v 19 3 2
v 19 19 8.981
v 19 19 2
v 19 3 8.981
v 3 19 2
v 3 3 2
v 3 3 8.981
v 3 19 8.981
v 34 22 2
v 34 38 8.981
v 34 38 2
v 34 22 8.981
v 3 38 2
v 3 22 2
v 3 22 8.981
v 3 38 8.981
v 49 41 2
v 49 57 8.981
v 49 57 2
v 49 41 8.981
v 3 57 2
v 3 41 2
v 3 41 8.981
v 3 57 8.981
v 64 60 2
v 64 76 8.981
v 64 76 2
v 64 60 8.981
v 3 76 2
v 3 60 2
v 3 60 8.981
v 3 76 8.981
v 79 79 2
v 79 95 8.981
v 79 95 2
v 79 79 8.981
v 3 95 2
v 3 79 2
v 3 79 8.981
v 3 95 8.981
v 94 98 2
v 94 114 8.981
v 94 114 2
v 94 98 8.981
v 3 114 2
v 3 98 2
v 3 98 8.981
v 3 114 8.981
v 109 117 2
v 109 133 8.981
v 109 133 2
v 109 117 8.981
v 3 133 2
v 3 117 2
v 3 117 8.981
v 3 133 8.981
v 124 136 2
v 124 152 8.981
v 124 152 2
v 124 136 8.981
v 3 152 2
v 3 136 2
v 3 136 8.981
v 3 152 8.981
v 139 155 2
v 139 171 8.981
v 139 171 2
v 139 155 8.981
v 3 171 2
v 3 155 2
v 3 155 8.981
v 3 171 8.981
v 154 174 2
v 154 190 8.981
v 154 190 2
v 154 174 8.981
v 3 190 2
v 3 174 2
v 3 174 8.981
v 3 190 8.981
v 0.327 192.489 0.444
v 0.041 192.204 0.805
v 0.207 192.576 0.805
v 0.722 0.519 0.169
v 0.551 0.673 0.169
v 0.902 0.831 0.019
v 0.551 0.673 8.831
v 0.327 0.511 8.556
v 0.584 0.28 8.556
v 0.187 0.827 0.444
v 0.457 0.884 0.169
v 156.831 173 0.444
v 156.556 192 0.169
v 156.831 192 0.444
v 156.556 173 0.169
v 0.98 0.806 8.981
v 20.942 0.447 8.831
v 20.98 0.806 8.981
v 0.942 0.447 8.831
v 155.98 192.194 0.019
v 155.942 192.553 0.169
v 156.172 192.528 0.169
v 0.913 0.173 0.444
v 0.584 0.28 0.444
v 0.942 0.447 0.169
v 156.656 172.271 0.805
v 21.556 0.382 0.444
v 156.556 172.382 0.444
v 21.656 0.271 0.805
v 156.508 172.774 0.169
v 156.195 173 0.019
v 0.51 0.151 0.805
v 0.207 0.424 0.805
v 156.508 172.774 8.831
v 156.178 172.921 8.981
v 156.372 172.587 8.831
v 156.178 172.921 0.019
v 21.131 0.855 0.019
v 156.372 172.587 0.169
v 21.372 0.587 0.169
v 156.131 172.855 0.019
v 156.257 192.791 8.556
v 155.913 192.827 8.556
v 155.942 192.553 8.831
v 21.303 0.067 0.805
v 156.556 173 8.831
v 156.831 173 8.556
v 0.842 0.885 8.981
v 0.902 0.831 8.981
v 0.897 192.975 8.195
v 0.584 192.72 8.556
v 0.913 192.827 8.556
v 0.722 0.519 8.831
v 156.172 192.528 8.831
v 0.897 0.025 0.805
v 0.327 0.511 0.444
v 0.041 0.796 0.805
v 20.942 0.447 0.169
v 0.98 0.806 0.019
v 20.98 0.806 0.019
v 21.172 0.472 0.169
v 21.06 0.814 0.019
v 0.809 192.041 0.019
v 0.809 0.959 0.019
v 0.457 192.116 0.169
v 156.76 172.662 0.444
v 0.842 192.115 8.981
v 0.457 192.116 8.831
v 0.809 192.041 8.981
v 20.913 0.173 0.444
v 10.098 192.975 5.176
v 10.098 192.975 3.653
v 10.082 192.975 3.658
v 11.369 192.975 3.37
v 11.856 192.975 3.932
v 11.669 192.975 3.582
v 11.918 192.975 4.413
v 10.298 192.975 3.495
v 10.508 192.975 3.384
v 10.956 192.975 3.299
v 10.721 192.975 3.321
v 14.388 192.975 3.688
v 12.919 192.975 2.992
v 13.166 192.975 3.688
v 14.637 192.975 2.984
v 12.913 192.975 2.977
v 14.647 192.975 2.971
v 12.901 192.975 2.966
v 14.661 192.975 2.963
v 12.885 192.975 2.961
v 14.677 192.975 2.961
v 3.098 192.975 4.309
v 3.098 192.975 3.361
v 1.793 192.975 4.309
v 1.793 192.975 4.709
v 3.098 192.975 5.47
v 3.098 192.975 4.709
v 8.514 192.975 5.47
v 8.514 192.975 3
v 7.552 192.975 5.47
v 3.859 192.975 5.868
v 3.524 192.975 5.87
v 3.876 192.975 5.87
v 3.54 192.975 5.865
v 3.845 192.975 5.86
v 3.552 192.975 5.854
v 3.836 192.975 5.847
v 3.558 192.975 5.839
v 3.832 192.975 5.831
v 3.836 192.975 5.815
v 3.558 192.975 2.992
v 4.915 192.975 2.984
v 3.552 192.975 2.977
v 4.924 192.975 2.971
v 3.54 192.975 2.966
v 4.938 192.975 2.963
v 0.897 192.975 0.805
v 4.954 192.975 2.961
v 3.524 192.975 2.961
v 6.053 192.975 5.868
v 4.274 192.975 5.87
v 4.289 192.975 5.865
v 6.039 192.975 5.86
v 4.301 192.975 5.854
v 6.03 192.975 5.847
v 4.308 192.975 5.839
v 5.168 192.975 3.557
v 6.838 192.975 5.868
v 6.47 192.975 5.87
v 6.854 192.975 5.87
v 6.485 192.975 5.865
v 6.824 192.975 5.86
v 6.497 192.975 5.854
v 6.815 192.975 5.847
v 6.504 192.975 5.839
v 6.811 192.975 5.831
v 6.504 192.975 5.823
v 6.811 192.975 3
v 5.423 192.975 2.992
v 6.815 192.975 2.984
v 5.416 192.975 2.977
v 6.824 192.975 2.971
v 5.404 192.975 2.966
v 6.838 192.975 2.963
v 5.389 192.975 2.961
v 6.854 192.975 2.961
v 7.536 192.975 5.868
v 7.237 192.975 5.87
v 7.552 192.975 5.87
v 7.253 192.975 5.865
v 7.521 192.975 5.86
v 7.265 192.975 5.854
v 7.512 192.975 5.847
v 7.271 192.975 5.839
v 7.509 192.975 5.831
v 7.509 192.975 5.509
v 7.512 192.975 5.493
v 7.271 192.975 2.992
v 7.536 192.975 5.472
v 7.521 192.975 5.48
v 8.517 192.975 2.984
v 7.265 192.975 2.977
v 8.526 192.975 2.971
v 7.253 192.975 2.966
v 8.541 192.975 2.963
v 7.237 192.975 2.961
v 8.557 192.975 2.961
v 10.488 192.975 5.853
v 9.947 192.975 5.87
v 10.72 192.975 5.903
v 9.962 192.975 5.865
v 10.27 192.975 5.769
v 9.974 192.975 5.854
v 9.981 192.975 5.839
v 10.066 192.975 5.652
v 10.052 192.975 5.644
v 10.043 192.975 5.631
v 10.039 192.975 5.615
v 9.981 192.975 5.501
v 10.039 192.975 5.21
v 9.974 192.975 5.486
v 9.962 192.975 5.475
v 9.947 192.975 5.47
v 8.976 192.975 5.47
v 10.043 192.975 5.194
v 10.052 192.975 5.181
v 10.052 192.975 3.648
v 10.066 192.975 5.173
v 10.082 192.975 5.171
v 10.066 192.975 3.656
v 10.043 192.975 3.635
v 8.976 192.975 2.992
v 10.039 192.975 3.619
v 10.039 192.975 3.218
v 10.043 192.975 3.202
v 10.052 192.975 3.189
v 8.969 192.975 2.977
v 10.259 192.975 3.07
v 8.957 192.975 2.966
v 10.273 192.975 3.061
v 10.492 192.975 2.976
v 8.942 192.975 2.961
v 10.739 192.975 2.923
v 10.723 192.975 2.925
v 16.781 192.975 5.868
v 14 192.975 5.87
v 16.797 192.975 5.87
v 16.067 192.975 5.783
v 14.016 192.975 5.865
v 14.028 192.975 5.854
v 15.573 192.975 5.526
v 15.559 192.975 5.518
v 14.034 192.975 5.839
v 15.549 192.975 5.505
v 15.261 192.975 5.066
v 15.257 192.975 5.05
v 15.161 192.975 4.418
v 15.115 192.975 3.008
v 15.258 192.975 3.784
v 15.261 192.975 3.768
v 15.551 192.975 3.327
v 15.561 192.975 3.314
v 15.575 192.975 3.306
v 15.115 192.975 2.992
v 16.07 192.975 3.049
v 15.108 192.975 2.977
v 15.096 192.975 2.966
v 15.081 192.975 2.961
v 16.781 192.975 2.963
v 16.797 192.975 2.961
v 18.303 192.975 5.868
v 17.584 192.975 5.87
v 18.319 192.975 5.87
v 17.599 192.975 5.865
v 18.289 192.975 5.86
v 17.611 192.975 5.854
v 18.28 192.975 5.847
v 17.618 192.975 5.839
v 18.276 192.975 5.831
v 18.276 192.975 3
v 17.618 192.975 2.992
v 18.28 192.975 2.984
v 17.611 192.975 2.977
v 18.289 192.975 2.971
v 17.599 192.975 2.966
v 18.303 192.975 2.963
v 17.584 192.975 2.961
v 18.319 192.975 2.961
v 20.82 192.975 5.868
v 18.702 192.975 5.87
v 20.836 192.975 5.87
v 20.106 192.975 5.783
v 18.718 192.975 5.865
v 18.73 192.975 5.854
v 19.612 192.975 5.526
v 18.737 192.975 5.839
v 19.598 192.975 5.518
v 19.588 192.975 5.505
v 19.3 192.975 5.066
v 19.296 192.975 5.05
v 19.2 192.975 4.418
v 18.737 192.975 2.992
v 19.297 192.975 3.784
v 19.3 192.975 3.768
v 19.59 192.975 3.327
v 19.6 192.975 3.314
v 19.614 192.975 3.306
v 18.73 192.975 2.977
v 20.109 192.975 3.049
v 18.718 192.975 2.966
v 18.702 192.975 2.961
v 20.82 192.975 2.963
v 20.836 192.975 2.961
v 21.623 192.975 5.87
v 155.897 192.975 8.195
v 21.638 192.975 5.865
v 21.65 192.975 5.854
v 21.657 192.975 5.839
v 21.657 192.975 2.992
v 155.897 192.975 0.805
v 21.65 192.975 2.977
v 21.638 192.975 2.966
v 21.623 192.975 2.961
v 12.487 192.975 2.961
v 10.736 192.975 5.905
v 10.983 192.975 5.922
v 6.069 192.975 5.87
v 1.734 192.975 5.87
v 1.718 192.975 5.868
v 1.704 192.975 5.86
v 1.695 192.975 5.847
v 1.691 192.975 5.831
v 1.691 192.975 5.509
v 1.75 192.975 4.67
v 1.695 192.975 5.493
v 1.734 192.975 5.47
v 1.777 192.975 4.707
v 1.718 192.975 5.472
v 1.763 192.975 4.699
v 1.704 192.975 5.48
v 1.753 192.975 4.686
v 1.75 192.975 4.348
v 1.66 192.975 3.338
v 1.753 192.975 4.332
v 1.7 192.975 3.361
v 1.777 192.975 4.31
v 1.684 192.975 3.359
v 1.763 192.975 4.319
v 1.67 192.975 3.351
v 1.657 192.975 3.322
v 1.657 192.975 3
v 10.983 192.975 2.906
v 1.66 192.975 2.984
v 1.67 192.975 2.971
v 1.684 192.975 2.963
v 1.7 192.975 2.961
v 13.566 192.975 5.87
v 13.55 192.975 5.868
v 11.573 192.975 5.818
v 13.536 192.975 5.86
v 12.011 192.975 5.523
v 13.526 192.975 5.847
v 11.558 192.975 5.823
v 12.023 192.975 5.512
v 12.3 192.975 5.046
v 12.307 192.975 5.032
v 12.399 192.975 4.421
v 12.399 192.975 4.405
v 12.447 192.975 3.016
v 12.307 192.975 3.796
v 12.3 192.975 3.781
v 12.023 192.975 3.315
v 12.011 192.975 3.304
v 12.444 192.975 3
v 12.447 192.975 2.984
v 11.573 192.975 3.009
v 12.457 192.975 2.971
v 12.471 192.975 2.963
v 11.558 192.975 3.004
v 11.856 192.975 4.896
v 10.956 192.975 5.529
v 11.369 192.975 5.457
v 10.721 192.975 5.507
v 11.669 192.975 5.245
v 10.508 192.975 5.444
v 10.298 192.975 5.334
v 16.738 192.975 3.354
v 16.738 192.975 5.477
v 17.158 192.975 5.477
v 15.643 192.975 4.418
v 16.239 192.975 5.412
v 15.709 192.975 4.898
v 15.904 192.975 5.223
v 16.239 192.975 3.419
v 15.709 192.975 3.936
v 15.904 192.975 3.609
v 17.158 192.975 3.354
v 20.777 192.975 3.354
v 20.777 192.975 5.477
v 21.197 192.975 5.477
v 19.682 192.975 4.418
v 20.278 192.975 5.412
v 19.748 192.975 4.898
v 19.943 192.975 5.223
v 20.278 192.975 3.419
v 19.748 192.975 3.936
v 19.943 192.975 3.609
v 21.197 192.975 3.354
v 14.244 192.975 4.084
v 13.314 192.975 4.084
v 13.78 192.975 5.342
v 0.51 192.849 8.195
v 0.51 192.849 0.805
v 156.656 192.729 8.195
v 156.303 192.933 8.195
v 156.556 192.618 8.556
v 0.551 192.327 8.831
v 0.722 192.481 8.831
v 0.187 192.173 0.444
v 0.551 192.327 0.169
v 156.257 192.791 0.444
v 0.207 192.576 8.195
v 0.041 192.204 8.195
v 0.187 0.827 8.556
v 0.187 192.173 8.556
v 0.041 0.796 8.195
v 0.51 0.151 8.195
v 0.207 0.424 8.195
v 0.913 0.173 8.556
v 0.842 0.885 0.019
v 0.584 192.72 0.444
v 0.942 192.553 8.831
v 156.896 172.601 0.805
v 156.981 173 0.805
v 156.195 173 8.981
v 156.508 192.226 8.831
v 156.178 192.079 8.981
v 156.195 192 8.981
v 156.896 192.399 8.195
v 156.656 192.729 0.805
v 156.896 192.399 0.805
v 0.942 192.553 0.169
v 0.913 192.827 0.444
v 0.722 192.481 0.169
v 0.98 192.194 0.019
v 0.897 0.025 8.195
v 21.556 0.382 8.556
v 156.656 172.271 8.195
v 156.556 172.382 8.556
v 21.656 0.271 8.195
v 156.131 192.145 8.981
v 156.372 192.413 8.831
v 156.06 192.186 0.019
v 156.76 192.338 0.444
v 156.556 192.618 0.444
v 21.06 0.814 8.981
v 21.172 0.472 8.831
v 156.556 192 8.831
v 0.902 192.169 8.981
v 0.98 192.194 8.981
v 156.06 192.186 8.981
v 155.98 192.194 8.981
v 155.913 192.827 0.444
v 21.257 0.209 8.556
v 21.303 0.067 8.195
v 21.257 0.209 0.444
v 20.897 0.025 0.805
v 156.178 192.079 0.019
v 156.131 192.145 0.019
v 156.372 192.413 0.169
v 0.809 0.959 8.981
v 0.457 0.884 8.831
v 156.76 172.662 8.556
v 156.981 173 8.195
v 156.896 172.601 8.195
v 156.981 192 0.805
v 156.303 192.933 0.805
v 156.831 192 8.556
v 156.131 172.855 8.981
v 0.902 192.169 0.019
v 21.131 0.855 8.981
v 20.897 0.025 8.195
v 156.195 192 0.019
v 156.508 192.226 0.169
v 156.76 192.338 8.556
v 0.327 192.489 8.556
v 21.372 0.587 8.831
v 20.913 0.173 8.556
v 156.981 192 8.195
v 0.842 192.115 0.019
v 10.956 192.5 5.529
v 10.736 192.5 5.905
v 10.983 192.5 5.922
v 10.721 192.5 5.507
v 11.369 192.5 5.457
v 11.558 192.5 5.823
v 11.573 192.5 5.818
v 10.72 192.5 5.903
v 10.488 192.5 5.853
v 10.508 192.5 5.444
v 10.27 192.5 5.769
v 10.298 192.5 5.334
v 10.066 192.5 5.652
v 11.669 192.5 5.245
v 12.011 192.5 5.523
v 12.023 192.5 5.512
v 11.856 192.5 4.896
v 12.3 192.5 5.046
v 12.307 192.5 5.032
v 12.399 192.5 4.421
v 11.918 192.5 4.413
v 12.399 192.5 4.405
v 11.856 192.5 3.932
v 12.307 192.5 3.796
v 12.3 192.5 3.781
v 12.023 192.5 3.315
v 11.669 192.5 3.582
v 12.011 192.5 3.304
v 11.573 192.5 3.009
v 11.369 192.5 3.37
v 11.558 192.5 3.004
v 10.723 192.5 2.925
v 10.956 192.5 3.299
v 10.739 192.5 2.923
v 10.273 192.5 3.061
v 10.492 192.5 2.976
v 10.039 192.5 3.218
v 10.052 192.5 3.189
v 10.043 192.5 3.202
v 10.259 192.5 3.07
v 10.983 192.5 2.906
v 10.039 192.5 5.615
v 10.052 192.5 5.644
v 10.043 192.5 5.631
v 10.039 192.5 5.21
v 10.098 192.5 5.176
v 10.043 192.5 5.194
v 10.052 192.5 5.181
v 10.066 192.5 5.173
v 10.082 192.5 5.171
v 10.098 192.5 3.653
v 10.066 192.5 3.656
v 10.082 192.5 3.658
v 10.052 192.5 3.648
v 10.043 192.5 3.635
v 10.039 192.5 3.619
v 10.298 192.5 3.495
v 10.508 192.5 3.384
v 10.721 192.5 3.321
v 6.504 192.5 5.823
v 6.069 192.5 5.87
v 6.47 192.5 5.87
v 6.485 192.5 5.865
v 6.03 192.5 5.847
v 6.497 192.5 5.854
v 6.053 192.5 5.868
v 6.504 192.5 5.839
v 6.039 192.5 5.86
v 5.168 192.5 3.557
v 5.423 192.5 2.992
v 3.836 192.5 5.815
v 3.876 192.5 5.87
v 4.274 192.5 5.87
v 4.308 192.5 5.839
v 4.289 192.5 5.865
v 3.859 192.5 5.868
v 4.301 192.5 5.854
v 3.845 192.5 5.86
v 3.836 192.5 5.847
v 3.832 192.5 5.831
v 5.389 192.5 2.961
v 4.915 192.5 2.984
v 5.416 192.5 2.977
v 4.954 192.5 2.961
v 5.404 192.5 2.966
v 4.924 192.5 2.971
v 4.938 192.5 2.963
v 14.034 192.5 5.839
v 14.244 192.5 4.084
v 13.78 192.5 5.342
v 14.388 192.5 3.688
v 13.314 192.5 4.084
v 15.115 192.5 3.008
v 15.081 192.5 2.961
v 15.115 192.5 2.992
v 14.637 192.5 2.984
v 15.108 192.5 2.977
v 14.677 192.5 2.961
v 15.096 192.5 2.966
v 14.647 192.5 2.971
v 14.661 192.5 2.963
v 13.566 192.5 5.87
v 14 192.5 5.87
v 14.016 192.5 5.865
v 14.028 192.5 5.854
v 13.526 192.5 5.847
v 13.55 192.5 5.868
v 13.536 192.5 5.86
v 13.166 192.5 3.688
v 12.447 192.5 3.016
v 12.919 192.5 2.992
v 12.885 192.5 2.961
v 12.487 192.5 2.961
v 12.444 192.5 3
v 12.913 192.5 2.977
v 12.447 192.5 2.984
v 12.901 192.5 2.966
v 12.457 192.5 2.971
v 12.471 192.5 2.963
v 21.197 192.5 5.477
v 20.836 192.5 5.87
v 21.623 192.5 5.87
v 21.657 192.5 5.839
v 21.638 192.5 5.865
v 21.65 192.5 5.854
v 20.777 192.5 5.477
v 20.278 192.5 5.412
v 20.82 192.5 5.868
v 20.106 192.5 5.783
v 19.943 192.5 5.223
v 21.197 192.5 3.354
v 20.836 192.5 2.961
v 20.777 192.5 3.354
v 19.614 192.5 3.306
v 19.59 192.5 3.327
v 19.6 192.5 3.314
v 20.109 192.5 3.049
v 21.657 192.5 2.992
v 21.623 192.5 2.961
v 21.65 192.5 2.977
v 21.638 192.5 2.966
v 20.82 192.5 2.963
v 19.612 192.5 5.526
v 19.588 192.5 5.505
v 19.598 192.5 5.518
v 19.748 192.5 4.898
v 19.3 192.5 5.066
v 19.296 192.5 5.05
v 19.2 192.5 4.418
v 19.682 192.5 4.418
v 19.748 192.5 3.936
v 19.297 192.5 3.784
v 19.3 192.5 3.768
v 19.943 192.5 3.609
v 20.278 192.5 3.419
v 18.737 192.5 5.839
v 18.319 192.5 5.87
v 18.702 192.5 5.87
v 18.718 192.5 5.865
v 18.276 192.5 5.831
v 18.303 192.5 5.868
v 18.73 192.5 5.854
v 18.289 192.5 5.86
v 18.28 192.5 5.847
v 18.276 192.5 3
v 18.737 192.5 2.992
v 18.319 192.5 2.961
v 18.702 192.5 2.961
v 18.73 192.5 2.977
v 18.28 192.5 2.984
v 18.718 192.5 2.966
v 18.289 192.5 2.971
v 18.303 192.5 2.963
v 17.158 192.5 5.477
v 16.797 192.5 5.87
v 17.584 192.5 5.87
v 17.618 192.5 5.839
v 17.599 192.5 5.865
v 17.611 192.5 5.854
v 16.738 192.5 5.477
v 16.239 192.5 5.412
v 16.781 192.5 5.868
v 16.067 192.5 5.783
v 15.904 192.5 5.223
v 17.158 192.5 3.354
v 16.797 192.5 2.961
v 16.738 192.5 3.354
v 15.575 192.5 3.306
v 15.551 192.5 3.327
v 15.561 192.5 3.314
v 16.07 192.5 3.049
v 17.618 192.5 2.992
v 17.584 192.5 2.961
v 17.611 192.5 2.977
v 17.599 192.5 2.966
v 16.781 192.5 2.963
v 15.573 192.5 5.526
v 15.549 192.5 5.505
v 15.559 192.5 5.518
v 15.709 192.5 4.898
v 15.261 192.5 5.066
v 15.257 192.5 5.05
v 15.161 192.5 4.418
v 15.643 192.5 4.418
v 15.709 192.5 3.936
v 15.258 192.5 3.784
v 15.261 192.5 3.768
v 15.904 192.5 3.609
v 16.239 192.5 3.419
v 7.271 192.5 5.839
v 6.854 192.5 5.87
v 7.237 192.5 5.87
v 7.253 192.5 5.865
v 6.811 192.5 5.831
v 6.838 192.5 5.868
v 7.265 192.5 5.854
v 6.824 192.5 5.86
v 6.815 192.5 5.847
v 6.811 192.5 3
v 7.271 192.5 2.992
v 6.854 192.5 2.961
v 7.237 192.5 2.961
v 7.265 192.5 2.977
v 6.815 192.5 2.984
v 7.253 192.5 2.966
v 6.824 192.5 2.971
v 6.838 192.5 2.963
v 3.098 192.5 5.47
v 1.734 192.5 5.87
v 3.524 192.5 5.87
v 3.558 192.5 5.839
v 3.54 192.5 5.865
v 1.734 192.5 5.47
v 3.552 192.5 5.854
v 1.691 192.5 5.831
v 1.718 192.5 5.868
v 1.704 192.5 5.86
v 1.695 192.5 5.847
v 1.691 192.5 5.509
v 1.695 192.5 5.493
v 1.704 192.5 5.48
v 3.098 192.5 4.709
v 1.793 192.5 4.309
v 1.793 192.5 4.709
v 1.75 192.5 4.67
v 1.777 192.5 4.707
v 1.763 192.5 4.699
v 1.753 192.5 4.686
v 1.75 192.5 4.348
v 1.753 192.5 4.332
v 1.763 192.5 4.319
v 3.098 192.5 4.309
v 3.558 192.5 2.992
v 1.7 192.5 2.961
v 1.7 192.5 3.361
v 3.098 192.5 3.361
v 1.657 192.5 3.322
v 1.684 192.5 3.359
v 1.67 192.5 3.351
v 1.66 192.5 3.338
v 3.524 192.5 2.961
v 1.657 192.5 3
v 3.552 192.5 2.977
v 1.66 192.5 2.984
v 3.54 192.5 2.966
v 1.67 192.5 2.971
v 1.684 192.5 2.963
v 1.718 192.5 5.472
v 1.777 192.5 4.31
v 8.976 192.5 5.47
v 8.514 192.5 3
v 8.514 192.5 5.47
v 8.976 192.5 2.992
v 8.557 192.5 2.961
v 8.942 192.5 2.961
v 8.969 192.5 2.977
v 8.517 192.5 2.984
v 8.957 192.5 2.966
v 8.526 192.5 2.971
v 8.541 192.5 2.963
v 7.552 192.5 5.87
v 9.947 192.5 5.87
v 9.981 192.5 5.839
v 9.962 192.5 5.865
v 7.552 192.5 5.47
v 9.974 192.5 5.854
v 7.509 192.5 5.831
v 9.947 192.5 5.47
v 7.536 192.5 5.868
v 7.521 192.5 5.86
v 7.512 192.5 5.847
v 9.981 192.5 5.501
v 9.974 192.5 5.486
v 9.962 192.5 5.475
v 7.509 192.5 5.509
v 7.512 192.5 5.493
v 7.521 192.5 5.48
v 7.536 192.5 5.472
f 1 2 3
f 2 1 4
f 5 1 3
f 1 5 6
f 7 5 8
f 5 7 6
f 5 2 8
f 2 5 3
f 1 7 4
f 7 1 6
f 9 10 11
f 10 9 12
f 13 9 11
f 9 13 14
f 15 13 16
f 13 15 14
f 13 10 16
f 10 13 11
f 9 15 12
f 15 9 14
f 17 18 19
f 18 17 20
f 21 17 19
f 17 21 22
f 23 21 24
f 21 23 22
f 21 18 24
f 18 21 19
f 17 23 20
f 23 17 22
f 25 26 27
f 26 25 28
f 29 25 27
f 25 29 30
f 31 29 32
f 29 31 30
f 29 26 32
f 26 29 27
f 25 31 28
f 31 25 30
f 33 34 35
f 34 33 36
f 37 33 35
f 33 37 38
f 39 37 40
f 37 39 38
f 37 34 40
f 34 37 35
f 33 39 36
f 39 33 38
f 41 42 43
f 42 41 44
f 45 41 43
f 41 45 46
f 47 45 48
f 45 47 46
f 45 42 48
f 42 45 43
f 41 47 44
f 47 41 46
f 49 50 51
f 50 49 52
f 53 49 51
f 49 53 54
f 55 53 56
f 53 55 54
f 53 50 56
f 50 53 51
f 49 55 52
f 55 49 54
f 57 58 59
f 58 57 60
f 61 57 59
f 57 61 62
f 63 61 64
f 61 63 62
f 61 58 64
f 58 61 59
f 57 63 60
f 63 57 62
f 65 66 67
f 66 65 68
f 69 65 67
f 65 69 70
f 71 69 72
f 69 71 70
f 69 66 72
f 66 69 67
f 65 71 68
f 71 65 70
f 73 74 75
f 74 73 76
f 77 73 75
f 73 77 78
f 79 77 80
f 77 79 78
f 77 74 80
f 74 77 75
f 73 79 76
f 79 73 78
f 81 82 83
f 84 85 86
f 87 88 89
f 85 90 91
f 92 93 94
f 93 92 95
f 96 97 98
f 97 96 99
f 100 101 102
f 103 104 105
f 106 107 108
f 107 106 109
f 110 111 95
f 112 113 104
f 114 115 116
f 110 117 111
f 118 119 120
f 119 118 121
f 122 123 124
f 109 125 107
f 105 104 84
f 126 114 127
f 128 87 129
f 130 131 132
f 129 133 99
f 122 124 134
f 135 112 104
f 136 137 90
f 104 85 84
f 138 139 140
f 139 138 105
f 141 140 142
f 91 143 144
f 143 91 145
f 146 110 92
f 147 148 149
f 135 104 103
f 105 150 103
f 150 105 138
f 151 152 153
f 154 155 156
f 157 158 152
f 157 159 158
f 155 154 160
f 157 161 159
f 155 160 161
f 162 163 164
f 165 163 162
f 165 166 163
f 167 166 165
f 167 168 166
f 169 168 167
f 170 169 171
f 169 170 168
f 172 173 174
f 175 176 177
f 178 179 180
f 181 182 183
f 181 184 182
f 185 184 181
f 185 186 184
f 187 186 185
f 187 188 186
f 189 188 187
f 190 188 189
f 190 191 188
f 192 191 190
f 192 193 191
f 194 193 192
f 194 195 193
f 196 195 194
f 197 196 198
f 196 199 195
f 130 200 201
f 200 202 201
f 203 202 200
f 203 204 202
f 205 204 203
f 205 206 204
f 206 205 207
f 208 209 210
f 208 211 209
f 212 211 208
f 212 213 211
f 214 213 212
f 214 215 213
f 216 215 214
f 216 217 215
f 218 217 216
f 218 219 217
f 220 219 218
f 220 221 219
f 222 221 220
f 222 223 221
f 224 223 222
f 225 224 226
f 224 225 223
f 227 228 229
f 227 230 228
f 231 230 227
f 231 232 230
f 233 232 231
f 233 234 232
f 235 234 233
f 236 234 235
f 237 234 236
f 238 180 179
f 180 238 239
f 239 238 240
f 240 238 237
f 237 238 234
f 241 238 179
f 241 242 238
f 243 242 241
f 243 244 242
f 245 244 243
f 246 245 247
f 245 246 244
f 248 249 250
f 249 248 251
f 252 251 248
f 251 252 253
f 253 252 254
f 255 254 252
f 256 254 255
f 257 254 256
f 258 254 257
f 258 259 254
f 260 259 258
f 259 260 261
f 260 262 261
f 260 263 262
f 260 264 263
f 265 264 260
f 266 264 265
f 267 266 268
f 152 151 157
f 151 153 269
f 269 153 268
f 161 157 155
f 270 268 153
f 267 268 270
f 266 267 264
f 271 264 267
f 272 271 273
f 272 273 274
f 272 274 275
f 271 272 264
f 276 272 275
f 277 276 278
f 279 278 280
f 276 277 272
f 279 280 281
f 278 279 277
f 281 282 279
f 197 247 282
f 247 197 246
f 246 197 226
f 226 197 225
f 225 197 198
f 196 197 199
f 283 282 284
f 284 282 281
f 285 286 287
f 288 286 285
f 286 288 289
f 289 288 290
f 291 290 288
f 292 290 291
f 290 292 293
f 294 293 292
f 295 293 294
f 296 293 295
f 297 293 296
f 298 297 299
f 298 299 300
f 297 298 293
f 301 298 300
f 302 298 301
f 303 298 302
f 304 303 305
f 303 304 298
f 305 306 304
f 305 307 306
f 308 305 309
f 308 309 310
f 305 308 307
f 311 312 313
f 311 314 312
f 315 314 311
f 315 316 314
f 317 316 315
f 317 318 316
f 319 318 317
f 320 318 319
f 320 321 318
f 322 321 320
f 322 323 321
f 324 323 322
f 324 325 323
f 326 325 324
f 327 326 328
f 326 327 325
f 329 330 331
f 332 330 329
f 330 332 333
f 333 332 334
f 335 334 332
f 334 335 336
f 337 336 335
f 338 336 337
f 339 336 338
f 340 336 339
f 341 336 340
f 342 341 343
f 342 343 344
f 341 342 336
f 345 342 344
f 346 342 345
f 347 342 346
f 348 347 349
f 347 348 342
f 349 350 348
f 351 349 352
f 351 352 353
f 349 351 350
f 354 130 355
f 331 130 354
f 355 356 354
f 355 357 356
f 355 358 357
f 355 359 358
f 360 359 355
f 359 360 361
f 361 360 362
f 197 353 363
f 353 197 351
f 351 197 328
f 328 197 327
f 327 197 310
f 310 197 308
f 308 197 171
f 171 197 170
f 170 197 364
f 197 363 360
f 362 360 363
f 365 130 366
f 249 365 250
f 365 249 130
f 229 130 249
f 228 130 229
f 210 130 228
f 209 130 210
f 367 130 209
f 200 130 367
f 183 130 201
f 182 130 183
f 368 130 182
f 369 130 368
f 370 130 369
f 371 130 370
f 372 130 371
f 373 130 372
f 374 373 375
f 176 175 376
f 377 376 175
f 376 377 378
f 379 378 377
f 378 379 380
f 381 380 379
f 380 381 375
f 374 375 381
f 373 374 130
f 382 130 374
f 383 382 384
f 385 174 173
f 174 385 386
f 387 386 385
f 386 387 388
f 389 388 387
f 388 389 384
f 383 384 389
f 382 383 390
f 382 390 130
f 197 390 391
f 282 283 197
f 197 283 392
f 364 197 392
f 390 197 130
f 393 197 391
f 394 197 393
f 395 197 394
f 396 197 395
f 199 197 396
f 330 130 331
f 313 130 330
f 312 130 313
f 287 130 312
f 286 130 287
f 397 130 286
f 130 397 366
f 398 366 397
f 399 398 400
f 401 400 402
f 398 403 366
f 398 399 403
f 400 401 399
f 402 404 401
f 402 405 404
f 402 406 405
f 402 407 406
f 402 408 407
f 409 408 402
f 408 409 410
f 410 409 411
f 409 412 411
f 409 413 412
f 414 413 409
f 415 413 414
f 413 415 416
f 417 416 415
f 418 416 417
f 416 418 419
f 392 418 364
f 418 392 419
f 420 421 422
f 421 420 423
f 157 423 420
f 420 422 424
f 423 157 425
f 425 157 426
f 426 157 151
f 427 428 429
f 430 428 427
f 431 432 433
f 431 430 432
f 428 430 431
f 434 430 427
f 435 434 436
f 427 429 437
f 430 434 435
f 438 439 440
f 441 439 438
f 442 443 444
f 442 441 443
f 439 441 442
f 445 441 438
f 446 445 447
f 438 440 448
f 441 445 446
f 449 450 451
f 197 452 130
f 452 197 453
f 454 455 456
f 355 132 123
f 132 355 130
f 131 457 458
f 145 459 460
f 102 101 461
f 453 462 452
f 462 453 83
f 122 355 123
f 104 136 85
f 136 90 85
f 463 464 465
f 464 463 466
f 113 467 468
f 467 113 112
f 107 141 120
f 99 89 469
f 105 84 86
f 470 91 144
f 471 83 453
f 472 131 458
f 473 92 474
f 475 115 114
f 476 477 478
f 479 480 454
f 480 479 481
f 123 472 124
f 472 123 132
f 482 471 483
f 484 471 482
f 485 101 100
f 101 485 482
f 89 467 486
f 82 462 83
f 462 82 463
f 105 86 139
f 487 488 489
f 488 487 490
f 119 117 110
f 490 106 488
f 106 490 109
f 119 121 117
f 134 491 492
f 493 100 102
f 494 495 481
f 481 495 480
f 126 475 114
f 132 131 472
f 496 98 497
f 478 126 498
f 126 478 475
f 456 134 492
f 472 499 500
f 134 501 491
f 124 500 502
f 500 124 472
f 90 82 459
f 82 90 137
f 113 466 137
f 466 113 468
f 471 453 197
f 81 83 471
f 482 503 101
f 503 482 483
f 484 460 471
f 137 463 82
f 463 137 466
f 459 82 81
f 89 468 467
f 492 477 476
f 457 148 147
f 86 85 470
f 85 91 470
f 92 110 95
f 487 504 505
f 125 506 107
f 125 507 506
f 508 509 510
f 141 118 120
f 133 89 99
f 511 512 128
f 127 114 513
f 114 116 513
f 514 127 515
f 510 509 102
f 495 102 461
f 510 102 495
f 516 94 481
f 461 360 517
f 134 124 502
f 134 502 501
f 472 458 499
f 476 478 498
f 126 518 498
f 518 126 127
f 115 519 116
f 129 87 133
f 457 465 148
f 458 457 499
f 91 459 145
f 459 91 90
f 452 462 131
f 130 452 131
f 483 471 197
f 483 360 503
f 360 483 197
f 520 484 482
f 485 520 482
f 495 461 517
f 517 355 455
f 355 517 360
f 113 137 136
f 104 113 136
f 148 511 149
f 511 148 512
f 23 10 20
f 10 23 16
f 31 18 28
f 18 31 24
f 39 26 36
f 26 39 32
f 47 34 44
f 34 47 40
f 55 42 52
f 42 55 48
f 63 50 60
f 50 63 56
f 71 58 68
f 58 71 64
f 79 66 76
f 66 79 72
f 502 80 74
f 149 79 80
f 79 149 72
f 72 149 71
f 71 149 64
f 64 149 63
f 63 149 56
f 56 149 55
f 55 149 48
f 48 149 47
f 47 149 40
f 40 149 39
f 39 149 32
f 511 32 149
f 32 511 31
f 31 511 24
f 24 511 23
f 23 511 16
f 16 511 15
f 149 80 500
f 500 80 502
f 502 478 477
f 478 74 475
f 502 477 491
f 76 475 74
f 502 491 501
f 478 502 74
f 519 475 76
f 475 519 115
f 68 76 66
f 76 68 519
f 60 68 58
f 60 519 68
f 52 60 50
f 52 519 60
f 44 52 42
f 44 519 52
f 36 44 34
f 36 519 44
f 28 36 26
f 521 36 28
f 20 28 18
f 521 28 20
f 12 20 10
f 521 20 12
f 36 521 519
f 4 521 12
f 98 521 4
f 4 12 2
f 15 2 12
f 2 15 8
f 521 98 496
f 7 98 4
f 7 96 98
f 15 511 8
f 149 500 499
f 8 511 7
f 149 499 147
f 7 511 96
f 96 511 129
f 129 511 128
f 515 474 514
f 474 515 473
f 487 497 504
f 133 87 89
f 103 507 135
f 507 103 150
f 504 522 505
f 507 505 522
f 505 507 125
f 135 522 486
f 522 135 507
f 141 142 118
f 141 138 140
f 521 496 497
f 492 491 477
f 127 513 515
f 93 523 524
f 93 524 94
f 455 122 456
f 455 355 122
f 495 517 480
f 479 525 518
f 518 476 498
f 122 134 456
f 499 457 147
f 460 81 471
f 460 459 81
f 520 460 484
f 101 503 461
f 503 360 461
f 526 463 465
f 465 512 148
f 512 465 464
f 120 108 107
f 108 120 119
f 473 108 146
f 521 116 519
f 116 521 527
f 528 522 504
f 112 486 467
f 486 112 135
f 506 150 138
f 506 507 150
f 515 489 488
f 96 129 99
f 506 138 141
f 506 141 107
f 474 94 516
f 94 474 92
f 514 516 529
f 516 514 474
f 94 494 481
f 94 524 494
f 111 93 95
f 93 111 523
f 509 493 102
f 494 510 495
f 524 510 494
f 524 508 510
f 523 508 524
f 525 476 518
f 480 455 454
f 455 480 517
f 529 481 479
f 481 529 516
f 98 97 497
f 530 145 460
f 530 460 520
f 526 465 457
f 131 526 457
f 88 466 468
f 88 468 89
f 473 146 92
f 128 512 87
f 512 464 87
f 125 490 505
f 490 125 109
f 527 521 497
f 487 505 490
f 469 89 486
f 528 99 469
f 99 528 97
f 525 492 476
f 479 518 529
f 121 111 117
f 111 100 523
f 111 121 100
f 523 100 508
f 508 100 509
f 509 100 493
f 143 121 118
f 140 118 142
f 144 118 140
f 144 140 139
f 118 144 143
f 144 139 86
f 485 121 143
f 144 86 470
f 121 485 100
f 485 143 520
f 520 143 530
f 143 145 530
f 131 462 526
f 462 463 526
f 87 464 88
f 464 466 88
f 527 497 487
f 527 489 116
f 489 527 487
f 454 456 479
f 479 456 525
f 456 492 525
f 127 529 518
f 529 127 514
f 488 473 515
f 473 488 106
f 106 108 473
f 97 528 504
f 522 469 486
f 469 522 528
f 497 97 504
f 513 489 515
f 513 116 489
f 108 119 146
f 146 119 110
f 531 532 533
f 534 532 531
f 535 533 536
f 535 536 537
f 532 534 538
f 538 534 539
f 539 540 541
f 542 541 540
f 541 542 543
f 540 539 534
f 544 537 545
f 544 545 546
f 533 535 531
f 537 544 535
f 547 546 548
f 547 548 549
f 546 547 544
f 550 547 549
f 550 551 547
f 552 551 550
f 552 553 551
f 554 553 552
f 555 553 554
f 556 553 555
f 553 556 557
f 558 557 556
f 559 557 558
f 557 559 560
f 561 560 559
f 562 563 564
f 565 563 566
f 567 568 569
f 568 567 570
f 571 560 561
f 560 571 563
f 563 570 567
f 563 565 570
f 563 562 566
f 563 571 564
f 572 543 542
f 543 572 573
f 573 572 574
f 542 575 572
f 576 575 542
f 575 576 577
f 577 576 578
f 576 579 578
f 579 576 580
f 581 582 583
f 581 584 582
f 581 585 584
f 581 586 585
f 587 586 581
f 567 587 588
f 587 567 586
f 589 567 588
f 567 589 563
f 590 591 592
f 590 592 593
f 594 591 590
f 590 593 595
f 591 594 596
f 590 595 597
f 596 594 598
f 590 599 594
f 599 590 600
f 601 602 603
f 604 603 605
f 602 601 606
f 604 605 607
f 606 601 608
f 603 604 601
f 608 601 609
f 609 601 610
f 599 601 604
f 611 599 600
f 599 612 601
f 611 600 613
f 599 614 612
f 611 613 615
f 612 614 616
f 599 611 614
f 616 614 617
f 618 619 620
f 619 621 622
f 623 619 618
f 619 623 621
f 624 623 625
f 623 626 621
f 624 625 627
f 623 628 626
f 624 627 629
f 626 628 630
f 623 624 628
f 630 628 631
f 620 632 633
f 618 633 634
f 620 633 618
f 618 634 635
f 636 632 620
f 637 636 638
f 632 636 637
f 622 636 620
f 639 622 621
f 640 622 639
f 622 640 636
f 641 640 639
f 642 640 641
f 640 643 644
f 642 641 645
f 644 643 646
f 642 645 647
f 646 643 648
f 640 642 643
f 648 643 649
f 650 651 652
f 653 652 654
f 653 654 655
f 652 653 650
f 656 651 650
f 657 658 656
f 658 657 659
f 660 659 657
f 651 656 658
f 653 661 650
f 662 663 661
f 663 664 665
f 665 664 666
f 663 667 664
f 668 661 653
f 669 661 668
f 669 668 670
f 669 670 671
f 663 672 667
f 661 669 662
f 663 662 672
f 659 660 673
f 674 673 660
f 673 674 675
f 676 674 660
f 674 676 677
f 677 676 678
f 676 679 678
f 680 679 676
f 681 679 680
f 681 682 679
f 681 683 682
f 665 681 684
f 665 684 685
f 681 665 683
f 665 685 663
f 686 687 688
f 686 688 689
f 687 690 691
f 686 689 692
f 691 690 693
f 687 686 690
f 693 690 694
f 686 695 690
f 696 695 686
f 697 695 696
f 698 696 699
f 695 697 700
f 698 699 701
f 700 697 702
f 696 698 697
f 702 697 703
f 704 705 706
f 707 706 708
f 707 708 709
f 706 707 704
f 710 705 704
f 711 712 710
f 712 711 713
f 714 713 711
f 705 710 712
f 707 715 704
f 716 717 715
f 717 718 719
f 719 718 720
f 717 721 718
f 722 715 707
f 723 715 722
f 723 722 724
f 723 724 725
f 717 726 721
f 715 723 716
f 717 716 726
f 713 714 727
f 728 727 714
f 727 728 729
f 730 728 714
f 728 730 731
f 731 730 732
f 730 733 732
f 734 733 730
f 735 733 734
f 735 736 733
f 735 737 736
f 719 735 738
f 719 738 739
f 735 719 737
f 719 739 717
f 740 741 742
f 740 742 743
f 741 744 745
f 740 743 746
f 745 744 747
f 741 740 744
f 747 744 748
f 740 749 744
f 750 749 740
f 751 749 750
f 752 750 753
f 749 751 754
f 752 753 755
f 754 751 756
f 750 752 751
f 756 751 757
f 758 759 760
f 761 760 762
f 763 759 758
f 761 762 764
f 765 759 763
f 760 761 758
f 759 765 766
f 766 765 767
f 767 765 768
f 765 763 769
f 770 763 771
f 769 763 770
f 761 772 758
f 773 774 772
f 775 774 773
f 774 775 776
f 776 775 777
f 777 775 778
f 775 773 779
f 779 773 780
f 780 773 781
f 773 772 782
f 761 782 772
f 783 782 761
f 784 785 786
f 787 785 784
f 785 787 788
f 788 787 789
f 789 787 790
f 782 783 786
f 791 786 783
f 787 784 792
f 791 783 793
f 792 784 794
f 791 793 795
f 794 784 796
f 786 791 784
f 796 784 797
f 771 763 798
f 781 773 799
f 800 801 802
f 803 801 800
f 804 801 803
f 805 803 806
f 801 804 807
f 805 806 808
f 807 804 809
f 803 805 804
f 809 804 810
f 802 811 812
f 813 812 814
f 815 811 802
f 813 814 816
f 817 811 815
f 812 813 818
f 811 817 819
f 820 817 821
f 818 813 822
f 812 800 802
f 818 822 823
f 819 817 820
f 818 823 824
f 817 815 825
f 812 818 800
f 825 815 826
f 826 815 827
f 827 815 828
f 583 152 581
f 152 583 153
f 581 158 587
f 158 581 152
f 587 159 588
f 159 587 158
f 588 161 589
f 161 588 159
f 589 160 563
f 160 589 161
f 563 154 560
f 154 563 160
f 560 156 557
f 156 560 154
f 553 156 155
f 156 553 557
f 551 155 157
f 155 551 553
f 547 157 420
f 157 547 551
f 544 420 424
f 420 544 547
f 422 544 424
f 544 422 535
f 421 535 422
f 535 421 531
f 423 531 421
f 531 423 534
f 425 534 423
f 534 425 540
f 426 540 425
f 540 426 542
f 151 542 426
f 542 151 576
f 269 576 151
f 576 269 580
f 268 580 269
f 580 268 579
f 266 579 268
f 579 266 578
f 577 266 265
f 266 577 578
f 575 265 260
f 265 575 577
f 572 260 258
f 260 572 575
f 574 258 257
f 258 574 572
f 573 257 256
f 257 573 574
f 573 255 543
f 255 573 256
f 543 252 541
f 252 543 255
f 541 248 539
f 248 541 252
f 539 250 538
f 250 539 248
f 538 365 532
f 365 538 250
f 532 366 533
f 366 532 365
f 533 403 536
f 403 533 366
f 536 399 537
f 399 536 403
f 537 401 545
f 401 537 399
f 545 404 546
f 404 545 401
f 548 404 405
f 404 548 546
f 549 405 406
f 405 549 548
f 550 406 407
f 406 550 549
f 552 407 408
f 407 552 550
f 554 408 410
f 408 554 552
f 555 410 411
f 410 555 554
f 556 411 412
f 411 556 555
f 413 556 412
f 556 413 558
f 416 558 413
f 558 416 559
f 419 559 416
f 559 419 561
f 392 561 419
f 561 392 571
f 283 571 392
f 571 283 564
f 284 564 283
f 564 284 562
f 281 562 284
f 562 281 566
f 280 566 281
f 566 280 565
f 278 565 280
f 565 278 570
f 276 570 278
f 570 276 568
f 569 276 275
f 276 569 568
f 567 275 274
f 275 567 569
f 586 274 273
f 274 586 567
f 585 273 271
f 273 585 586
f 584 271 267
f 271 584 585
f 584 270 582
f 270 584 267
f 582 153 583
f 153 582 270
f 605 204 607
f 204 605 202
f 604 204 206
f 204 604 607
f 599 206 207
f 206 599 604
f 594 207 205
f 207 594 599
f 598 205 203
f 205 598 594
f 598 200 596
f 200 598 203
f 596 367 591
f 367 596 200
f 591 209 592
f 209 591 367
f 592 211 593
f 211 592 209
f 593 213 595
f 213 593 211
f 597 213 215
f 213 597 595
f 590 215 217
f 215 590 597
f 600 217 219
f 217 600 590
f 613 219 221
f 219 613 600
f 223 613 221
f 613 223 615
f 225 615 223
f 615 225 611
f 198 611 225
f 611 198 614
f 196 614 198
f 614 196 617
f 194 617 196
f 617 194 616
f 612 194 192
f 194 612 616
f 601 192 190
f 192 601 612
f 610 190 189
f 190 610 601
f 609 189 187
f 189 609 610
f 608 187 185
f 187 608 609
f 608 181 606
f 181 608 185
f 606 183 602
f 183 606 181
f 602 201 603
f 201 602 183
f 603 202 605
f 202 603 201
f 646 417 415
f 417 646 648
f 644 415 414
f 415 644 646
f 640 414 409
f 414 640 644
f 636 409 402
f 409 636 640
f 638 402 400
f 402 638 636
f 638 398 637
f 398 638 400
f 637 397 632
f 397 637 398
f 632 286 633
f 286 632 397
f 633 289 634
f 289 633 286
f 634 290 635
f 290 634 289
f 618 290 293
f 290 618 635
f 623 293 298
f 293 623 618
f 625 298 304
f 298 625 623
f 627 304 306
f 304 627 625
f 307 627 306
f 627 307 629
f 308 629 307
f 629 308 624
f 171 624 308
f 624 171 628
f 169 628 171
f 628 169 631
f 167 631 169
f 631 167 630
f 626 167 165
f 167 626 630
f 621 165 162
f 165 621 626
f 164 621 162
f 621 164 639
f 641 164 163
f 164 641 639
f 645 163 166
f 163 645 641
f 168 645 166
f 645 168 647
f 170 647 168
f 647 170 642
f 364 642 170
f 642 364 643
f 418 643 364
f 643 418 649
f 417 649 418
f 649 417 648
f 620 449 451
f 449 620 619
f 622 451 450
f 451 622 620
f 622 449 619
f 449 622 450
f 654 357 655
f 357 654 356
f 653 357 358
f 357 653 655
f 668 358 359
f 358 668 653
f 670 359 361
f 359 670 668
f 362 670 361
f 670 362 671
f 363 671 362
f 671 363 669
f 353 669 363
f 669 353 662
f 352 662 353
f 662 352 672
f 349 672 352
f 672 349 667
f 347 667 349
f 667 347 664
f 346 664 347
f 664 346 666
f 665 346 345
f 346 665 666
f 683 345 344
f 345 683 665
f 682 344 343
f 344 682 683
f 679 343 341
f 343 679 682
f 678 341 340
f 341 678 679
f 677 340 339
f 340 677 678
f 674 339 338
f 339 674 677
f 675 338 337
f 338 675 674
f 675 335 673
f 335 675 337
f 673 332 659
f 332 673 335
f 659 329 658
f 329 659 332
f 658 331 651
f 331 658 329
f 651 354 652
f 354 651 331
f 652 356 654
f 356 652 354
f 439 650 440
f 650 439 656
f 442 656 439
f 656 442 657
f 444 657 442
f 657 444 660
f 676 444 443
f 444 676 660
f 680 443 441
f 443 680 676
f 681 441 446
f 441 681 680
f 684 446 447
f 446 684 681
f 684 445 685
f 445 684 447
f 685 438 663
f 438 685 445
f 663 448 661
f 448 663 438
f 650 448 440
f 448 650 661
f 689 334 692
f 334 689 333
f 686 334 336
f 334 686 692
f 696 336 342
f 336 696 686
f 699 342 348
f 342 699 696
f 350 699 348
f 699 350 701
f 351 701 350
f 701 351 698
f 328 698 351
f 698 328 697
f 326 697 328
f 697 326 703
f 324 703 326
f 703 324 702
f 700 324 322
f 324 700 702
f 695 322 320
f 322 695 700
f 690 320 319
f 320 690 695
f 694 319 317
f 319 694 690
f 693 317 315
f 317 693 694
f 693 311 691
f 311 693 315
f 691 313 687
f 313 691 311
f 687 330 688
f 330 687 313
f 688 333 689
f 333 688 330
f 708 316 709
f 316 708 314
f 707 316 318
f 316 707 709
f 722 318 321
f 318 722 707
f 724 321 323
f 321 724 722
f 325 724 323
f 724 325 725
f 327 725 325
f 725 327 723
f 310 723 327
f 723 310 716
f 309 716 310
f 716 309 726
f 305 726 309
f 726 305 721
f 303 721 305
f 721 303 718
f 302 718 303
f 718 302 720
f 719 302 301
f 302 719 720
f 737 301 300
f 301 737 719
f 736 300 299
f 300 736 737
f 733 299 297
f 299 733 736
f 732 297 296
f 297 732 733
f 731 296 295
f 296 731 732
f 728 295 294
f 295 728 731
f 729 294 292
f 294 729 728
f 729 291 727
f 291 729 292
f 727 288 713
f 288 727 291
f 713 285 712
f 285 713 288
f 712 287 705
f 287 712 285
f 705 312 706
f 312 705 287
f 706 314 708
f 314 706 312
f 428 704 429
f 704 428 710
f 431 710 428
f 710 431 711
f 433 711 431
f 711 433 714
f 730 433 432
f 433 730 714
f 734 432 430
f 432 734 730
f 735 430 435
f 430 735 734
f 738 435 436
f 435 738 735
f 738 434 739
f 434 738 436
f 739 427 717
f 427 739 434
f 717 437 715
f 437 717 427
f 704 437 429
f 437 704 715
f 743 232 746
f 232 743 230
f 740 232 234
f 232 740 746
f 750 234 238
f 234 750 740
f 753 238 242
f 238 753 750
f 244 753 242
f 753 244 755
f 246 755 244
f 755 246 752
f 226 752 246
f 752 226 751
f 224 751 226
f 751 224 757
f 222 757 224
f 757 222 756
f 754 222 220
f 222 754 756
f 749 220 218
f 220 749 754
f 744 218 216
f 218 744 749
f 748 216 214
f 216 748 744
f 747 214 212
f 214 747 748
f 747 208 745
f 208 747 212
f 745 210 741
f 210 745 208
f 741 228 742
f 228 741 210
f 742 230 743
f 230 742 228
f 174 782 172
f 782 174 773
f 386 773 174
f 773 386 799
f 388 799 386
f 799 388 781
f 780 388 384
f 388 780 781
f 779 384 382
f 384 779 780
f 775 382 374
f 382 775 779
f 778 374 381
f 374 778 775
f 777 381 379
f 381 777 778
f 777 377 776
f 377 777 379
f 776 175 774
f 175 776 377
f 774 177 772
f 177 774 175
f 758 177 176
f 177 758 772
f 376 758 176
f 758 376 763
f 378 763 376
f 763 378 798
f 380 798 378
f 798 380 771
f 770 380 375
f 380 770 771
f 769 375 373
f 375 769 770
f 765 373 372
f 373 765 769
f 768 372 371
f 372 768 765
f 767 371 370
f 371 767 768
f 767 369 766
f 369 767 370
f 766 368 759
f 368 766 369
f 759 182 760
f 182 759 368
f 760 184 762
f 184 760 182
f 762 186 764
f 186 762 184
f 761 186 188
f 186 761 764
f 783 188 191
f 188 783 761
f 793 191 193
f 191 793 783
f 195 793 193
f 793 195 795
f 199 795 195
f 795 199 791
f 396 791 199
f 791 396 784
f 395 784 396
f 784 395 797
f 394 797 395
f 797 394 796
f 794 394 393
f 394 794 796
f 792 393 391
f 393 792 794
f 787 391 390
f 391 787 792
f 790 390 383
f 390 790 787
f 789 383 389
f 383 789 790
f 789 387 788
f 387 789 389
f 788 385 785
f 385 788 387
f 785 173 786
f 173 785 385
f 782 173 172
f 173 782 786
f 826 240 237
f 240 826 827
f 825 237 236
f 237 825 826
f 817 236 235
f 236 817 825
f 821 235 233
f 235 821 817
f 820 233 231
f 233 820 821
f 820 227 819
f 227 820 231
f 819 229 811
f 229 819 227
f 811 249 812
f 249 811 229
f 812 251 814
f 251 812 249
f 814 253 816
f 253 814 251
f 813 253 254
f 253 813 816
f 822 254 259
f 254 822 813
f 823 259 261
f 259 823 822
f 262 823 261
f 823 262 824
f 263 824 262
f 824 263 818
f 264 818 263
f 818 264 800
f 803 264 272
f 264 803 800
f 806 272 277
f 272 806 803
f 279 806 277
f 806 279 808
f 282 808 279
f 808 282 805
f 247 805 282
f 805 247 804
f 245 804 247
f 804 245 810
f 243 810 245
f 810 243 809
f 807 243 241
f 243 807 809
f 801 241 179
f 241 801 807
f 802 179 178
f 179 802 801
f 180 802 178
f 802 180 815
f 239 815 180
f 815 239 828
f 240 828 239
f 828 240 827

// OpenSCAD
// file: logo.scad
module logo() {
	translate([-7, 68, 0]) logoText();
	logoShapes();
}

module logoText() {
	linear_extrude(height = 10) {
		minkowski() {
			text("DIDACTIVE", size=71.7, font="Century Gothic");
			circle(1);
		}
	}
}

module logoShapes() {
	step = 63;
	linear_extrude(height = 10) {
		translate([0*step, 0]) logoSquare();
		translate([1*step, 0]) logoCircle();
		translate([2*step, 0]) logoTriangle();
		translate([3*step, 0]) logoCircle();
		translate([4*step, 0]) logoSquare();
		translate([5*step, 0]) logoCircle();
		translate([6*step, 0]) logoTriangle();
		translate([7*step, 0]) logoCircle();
	}
}

module logoSquare() {
	difference() {
		square(52);
		translate([12, 12]) square(28);
	}
}

module logoCircle() {
	difference() {
		square(52);
		translate([26, 26]) circle(d=35);
	}
}

module logoTriangle() {
	a = 20;
	points = [[0, a], [-cos(30)*a, -sin(30)*a], [cos(30)*a, -sin(30)*a]];
	difference() {
		square(52);
		translate([26, 22]) polygon(points);
	}
}
// main file
$fn = 15;
include<logo.scad>

a = 15; // jednotková vzdálenost
numCubes = 10; // počet jednotek

border = 3; // prostor kolem hranolku, respektive vzdálenost mezi nimi
boardHeight = 9; // plná tloušťka destičky
indentDepth = 7; // hloubka díry pro hranolek
extraSpace = 0.5; // rezerva

roundness = 1; // zaoblení
logoDepth = 0.5; // hloubka loga
logoSize = 20; // velikost loga

chunkSize = a + border + 2*extraSpace;
boardSize = numCubes * chunkSize + border;

module base() {
	translate([roundness, roundness, 0]) sphere(roundness);
	translate([chunkSize + border - roundness, roundness, 0]) sphere(roundness);
	translate([10*a + 2*border + 2*extraSpace - roundness, boardSize - chunkSize - roundness, 0]) sphere(roundness);
	translate([10*a + 2*border + 2*extraSpace - roundness, boardSize - roundness, 0]) sphere(roundness);
	translate([roundness, boardSize - roundness, 0]) sphere(roundness);
}

module chunk(size) {
	cube([a*size + 2*extraSpace, a + 2*extraSpace, indentDepth]);
}

module board() {
	difference() {
		hull() {
			translate([0, 0, roundness]) base();
			translate([0, 0, boardHeight - roundness]) base();	
		}
		// indents
		for (i = [1 : numCubes]) {
			translate([border, border + (i-1) * chunkSize, boardHeight-indentDepth]) chunk(i);
		}
	}
}

difference() {
	board();
	// logo
	translate([logoSize + 2, boardSize - logoDepth, (boardHeight - 0.15*logoSize) / 2])
	rotate([90, 0, 180]) resize([logoSize, 0, 1.01*logoDepth], auto=true) logoText();
}
